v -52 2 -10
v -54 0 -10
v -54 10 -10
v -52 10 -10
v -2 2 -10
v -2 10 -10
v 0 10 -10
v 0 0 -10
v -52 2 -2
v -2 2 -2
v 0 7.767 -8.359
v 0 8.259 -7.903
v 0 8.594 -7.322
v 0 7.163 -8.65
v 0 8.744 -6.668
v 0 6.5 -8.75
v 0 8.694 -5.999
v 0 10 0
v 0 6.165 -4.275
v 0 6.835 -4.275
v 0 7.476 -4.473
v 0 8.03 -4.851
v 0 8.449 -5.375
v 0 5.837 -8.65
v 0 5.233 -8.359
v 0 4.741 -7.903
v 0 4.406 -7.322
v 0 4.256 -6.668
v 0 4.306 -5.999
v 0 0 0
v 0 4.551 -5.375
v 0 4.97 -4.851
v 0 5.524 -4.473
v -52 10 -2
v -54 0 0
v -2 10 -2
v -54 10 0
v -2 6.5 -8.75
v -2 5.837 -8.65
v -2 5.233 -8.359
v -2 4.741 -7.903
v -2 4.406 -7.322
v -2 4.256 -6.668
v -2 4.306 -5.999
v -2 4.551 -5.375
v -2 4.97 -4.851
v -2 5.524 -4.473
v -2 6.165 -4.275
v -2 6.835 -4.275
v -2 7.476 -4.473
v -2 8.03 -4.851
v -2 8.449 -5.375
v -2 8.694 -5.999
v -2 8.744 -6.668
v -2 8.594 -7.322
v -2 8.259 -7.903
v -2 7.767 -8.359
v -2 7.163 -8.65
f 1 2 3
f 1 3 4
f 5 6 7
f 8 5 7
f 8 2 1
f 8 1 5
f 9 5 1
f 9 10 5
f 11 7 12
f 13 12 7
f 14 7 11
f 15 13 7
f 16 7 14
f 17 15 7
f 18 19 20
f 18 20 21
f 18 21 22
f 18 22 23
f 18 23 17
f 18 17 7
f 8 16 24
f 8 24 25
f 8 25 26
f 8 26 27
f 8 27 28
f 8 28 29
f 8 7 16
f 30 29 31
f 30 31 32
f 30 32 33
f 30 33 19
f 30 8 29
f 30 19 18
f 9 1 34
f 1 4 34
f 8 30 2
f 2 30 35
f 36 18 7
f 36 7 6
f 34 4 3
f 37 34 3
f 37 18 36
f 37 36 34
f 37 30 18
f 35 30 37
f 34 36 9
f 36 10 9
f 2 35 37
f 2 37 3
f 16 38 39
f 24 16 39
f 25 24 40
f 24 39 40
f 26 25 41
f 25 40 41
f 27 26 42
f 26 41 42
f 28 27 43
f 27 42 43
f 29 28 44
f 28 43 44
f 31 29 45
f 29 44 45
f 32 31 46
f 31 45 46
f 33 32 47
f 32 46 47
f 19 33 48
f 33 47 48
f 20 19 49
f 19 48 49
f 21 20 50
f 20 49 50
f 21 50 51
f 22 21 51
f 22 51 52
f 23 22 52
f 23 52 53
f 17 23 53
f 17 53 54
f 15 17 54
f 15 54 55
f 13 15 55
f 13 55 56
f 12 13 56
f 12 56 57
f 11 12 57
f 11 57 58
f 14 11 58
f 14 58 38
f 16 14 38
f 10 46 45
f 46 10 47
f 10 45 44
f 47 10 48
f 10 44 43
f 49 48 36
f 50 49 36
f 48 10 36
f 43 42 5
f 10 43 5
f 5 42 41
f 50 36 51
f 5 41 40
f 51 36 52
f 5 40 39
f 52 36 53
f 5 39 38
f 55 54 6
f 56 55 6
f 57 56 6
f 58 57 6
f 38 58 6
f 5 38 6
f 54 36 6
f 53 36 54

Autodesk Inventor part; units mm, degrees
ref_plane "YZ Plane" through (0, 0, 0) normal (1, 0, 0) x (0, 1, 0)
ref_plane "XZ Plane" through (0, 0, 0) normal (0, 1, 0) x (-1, 0, 0)
ref_plane "XY Plane" through (0, 0, 0) normal (0, 0, 1) x (1, 0, 0)
sketch "Sketch1" plane through (0, 0, 0) normal (0, 1, 0) x (-1, 0, 0)
  line L0 (0, 0) -> (54, 0)
  line L1 (54, 0) -> (54, -10)
  line L2 (54, -10) -> (0, -10)
  line L3 (0, -10) -> (0, 0)
  line L4 (54, 0) -> (0, 0)
  line L5 (0, 0) -> (0, -2)
  line L6 (0, -2) -> (54, -2)
  line L7 (54, -2) -> (54, 0)
  dimension "d0" = 54
  dimension "d1" = 10
  dimension "d3" = 2
extrude "Extrusion1" add sketch "Sketch1" along normal blind 2 contours L6 L1 L2 L3
extrude "Extrusion2" add sketch "Sketch1" along normal blind 10 contours L0 L1 L6 L3
sketch "Sketch2" plane through (0, 0, -10) normal (1, 0, 0) x (0, 0, -1)
  line L0 (-10, 0) -> (0, 0) projected
  line L1 (-10, 0) -> (0, 0)
  line L2 (0, 0) -> (0, 10)
  line L3 (0, 10) -> (-10, 10)
  line L4 (-10, 10) -> (-10, 0)
  dimension "d8" = 10
  dimension "d9" = 10
extrude "Extrusion3" add sketch "Sketch2" against normal blind 2
sketch "Sketch3" plane through (-54, 0, -10) normal (-1, 0, 0) x (0, 0, 1)
  line L0 (0, 0) -> (0, 10) projected
  line L1 (10, 10) -> (0, 10) projected
  line L2 (0, 0) -> (10, 0)
  line L3 (10, 0) -> (10, 10)
  line L4 (10, 10) -> (0, 10)
  line L5 (0, 10) -> (0, 0)
  point P0 (10, 0)
extrude "Extrusion4" add sketch "Sketch3" against normal blind 2
sketch "Sketch5" plane through (0, 0, 0) normal (1, 0, 0) x (0, 0, -1)
  line L0 (10, 0) -> (10, 10) projected
  line L1 (0, 10) -> (10, 10) projected
  point P0 (0, 0)
  point P1 (6.5, 6.5)
  dimension "d19" = 3.5
  dimension "d20" = 3.5
hole "Hole1" at (0, 6.5, -6.5) direction (-1, 0, 0) diameter 4.5 depth 2 clearance for "Flat Head Machine Screw" size "M4" standard "Ansi Metric M Profile"
properties part number "Hinge Holder"
